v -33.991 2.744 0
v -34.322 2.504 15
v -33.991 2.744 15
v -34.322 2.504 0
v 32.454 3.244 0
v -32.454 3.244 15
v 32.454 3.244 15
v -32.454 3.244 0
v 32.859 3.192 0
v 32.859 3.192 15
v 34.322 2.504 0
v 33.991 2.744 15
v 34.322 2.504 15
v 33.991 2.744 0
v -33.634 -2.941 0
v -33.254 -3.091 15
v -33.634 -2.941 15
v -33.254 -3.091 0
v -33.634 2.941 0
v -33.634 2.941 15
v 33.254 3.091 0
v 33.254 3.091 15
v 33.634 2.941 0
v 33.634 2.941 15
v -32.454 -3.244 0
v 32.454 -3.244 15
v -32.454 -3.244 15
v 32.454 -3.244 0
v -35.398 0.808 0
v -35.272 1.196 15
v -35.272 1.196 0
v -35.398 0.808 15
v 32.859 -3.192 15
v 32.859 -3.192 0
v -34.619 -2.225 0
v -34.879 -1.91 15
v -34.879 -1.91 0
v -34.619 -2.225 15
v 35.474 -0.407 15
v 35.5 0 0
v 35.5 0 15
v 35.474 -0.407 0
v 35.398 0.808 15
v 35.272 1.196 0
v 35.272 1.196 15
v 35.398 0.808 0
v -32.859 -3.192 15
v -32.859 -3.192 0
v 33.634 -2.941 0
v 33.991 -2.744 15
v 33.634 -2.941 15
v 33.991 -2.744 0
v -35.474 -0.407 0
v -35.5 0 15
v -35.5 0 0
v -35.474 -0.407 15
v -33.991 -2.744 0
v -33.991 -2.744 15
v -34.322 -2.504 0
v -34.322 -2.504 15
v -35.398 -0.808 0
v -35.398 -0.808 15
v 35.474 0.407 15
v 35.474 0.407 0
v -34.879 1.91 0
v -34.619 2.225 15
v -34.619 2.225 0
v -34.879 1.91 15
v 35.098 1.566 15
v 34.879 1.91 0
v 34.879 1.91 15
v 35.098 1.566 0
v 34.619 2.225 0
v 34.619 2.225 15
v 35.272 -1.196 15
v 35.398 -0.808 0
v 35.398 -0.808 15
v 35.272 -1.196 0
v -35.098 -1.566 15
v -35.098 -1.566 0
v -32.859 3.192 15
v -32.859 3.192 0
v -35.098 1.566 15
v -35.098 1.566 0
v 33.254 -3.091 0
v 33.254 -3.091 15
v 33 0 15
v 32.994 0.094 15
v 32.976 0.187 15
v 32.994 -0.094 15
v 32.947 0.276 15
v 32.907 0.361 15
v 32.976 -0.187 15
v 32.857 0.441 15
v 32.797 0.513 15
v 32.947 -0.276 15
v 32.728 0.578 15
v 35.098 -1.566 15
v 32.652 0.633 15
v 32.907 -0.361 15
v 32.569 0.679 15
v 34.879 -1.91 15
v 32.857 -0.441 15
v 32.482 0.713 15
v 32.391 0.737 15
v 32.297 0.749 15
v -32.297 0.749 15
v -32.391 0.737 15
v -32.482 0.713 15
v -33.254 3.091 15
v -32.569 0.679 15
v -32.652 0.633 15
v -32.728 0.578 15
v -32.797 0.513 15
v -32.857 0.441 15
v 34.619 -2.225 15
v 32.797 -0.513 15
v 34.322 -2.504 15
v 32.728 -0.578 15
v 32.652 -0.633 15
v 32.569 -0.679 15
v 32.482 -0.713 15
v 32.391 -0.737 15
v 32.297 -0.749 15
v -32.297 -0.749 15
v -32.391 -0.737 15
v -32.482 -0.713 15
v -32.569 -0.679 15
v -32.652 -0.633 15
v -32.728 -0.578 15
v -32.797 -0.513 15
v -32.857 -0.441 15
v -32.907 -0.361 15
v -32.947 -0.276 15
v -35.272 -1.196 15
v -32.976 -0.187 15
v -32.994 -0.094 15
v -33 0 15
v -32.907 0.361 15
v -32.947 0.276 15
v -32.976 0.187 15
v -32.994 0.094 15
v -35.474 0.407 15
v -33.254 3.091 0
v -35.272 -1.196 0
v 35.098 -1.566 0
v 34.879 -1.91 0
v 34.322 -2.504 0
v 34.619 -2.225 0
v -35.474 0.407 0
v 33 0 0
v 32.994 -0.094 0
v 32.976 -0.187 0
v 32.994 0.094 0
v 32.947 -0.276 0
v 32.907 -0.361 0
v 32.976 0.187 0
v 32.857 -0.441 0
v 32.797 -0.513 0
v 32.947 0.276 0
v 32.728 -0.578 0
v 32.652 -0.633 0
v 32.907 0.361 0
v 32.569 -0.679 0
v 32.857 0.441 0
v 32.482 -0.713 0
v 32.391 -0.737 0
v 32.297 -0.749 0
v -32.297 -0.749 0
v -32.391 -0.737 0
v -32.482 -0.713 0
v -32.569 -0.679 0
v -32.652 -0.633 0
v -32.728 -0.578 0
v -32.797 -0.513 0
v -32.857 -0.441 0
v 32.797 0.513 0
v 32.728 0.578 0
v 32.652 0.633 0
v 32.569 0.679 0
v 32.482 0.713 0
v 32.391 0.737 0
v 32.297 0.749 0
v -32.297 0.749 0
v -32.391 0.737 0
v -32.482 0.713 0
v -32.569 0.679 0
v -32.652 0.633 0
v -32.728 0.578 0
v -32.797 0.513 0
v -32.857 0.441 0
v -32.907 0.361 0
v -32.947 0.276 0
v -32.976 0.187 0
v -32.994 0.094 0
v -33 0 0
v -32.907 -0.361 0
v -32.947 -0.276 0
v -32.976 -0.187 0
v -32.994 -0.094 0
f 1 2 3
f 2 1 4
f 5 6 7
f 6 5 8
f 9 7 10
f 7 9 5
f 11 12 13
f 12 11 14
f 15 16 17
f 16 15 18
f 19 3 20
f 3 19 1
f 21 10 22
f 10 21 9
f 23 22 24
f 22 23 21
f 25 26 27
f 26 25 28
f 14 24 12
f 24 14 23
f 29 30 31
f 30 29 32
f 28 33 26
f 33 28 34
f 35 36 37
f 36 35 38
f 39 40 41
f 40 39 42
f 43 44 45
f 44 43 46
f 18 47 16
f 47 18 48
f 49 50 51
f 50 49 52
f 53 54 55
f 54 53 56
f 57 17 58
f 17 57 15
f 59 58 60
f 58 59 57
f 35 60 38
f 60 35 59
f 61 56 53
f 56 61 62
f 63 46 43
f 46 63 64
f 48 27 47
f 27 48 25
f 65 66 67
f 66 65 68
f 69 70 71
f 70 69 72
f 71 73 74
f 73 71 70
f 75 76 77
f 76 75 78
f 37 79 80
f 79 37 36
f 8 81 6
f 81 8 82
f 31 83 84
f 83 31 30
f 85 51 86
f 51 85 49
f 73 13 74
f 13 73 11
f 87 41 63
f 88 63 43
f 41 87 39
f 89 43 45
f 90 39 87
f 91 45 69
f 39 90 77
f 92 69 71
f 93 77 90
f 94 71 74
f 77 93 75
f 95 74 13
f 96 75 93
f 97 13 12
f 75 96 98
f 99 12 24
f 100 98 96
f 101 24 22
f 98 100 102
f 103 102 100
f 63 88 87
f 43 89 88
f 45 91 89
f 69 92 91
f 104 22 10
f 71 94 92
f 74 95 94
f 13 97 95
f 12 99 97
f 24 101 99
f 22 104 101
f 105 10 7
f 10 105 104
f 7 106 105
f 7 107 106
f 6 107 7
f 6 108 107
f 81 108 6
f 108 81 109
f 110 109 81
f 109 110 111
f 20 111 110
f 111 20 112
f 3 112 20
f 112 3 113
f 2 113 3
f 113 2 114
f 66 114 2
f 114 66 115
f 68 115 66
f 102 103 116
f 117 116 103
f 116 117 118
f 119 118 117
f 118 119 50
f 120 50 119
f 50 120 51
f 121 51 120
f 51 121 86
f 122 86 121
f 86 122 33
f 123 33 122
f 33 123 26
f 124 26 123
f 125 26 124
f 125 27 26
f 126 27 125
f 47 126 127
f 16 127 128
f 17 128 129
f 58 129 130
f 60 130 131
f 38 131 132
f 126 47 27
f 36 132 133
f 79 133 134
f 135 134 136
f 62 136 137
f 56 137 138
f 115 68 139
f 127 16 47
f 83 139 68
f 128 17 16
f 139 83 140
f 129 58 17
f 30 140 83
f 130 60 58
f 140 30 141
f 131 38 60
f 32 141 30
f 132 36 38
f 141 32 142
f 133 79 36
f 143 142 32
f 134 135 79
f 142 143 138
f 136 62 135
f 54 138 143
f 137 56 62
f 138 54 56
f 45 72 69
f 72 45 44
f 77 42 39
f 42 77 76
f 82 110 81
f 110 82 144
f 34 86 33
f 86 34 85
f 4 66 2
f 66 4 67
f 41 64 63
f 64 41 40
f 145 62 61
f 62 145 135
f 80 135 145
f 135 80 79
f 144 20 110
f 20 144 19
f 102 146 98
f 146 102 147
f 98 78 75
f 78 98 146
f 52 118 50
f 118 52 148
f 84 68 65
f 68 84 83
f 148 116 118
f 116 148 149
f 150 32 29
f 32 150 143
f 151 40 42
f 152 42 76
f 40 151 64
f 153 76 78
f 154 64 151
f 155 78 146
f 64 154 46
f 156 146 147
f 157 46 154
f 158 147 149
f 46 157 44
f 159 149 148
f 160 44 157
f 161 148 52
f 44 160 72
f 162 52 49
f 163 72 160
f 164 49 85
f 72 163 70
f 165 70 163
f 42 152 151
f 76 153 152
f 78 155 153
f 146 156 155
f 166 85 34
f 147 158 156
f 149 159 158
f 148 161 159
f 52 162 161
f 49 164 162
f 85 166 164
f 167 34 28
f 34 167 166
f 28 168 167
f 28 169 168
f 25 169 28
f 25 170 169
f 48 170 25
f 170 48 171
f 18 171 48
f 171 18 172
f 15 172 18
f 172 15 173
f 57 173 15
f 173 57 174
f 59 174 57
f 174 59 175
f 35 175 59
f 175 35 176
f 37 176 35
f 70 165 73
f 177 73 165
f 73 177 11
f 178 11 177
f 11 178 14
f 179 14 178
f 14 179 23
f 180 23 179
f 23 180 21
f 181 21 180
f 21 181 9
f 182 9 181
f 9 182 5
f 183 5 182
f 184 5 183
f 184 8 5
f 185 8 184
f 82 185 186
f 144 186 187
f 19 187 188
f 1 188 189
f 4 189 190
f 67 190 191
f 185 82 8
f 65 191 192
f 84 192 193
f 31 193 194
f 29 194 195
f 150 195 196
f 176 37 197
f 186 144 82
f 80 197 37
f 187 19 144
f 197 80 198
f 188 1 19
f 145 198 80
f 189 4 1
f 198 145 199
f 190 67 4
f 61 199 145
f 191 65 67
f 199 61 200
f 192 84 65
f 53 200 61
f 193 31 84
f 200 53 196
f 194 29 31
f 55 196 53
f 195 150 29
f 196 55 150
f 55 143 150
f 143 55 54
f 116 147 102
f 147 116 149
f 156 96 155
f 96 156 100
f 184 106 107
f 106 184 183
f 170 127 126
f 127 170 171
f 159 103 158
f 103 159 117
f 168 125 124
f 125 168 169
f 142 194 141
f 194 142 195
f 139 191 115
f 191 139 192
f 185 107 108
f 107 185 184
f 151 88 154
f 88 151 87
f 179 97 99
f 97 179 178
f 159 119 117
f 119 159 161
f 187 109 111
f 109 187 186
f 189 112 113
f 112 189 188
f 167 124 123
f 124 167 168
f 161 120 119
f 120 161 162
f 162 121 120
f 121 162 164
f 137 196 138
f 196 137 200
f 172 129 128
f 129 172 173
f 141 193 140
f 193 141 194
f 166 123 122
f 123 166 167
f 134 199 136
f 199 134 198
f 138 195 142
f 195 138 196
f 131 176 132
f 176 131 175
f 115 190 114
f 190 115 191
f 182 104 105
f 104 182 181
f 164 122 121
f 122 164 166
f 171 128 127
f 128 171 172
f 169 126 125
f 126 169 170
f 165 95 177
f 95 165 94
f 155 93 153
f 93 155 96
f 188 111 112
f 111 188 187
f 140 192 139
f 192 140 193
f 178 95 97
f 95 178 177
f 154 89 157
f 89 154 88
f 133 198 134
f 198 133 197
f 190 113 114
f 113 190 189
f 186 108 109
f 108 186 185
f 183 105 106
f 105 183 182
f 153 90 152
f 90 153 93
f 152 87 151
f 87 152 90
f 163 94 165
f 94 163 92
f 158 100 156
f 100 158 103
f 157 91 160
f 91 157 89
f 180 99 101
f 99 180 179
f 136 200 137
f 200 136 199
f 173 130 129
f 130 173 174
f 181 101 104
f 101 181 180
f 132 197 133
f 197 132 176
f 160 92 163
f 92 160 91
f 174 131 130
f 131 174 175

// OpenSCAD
//
//  toothpastesqueezer.scad
//
//  EvilTeach
//
//  12/11/2016
//

$fn=50;                 // Make very smooth ends


slitWidth  = 66.00;     // Plenty of extra room to make it easy to put on
slitDepth  =  1.50;     // Just a bit too wide to make it easy to put on
slitHeight = 15.00;     // High enough that an adult finger covers it

thickness  =  5.00;     // Material outside of the slit

// Make a cube with rounded ends.
module rounded_cube(width, depth, height)
{
    hull()
    {
        translate([depth / 2, 0, 0])
            cylinder(d = depth, h = height);
        translate([width - depth / 2, 0, 0])
            cylinder(d = depth, h = height);
    }
}



module main()
{
    // Center on build plate
    translate([-((slitWidth + thickness) / 2) , 0, 0])
    
    // Make a large cube and remove the smaller slit from inside it
    difference()
    {
        rounded_cube(slitWidth + thickness, 
                     slitDepth + thickness, 
                     slitHeight);
        translate([thickness / 2, 0, 0])
            rounded_cube(slitWidth, slitDepth, slitHeight);
    }
}

main();
